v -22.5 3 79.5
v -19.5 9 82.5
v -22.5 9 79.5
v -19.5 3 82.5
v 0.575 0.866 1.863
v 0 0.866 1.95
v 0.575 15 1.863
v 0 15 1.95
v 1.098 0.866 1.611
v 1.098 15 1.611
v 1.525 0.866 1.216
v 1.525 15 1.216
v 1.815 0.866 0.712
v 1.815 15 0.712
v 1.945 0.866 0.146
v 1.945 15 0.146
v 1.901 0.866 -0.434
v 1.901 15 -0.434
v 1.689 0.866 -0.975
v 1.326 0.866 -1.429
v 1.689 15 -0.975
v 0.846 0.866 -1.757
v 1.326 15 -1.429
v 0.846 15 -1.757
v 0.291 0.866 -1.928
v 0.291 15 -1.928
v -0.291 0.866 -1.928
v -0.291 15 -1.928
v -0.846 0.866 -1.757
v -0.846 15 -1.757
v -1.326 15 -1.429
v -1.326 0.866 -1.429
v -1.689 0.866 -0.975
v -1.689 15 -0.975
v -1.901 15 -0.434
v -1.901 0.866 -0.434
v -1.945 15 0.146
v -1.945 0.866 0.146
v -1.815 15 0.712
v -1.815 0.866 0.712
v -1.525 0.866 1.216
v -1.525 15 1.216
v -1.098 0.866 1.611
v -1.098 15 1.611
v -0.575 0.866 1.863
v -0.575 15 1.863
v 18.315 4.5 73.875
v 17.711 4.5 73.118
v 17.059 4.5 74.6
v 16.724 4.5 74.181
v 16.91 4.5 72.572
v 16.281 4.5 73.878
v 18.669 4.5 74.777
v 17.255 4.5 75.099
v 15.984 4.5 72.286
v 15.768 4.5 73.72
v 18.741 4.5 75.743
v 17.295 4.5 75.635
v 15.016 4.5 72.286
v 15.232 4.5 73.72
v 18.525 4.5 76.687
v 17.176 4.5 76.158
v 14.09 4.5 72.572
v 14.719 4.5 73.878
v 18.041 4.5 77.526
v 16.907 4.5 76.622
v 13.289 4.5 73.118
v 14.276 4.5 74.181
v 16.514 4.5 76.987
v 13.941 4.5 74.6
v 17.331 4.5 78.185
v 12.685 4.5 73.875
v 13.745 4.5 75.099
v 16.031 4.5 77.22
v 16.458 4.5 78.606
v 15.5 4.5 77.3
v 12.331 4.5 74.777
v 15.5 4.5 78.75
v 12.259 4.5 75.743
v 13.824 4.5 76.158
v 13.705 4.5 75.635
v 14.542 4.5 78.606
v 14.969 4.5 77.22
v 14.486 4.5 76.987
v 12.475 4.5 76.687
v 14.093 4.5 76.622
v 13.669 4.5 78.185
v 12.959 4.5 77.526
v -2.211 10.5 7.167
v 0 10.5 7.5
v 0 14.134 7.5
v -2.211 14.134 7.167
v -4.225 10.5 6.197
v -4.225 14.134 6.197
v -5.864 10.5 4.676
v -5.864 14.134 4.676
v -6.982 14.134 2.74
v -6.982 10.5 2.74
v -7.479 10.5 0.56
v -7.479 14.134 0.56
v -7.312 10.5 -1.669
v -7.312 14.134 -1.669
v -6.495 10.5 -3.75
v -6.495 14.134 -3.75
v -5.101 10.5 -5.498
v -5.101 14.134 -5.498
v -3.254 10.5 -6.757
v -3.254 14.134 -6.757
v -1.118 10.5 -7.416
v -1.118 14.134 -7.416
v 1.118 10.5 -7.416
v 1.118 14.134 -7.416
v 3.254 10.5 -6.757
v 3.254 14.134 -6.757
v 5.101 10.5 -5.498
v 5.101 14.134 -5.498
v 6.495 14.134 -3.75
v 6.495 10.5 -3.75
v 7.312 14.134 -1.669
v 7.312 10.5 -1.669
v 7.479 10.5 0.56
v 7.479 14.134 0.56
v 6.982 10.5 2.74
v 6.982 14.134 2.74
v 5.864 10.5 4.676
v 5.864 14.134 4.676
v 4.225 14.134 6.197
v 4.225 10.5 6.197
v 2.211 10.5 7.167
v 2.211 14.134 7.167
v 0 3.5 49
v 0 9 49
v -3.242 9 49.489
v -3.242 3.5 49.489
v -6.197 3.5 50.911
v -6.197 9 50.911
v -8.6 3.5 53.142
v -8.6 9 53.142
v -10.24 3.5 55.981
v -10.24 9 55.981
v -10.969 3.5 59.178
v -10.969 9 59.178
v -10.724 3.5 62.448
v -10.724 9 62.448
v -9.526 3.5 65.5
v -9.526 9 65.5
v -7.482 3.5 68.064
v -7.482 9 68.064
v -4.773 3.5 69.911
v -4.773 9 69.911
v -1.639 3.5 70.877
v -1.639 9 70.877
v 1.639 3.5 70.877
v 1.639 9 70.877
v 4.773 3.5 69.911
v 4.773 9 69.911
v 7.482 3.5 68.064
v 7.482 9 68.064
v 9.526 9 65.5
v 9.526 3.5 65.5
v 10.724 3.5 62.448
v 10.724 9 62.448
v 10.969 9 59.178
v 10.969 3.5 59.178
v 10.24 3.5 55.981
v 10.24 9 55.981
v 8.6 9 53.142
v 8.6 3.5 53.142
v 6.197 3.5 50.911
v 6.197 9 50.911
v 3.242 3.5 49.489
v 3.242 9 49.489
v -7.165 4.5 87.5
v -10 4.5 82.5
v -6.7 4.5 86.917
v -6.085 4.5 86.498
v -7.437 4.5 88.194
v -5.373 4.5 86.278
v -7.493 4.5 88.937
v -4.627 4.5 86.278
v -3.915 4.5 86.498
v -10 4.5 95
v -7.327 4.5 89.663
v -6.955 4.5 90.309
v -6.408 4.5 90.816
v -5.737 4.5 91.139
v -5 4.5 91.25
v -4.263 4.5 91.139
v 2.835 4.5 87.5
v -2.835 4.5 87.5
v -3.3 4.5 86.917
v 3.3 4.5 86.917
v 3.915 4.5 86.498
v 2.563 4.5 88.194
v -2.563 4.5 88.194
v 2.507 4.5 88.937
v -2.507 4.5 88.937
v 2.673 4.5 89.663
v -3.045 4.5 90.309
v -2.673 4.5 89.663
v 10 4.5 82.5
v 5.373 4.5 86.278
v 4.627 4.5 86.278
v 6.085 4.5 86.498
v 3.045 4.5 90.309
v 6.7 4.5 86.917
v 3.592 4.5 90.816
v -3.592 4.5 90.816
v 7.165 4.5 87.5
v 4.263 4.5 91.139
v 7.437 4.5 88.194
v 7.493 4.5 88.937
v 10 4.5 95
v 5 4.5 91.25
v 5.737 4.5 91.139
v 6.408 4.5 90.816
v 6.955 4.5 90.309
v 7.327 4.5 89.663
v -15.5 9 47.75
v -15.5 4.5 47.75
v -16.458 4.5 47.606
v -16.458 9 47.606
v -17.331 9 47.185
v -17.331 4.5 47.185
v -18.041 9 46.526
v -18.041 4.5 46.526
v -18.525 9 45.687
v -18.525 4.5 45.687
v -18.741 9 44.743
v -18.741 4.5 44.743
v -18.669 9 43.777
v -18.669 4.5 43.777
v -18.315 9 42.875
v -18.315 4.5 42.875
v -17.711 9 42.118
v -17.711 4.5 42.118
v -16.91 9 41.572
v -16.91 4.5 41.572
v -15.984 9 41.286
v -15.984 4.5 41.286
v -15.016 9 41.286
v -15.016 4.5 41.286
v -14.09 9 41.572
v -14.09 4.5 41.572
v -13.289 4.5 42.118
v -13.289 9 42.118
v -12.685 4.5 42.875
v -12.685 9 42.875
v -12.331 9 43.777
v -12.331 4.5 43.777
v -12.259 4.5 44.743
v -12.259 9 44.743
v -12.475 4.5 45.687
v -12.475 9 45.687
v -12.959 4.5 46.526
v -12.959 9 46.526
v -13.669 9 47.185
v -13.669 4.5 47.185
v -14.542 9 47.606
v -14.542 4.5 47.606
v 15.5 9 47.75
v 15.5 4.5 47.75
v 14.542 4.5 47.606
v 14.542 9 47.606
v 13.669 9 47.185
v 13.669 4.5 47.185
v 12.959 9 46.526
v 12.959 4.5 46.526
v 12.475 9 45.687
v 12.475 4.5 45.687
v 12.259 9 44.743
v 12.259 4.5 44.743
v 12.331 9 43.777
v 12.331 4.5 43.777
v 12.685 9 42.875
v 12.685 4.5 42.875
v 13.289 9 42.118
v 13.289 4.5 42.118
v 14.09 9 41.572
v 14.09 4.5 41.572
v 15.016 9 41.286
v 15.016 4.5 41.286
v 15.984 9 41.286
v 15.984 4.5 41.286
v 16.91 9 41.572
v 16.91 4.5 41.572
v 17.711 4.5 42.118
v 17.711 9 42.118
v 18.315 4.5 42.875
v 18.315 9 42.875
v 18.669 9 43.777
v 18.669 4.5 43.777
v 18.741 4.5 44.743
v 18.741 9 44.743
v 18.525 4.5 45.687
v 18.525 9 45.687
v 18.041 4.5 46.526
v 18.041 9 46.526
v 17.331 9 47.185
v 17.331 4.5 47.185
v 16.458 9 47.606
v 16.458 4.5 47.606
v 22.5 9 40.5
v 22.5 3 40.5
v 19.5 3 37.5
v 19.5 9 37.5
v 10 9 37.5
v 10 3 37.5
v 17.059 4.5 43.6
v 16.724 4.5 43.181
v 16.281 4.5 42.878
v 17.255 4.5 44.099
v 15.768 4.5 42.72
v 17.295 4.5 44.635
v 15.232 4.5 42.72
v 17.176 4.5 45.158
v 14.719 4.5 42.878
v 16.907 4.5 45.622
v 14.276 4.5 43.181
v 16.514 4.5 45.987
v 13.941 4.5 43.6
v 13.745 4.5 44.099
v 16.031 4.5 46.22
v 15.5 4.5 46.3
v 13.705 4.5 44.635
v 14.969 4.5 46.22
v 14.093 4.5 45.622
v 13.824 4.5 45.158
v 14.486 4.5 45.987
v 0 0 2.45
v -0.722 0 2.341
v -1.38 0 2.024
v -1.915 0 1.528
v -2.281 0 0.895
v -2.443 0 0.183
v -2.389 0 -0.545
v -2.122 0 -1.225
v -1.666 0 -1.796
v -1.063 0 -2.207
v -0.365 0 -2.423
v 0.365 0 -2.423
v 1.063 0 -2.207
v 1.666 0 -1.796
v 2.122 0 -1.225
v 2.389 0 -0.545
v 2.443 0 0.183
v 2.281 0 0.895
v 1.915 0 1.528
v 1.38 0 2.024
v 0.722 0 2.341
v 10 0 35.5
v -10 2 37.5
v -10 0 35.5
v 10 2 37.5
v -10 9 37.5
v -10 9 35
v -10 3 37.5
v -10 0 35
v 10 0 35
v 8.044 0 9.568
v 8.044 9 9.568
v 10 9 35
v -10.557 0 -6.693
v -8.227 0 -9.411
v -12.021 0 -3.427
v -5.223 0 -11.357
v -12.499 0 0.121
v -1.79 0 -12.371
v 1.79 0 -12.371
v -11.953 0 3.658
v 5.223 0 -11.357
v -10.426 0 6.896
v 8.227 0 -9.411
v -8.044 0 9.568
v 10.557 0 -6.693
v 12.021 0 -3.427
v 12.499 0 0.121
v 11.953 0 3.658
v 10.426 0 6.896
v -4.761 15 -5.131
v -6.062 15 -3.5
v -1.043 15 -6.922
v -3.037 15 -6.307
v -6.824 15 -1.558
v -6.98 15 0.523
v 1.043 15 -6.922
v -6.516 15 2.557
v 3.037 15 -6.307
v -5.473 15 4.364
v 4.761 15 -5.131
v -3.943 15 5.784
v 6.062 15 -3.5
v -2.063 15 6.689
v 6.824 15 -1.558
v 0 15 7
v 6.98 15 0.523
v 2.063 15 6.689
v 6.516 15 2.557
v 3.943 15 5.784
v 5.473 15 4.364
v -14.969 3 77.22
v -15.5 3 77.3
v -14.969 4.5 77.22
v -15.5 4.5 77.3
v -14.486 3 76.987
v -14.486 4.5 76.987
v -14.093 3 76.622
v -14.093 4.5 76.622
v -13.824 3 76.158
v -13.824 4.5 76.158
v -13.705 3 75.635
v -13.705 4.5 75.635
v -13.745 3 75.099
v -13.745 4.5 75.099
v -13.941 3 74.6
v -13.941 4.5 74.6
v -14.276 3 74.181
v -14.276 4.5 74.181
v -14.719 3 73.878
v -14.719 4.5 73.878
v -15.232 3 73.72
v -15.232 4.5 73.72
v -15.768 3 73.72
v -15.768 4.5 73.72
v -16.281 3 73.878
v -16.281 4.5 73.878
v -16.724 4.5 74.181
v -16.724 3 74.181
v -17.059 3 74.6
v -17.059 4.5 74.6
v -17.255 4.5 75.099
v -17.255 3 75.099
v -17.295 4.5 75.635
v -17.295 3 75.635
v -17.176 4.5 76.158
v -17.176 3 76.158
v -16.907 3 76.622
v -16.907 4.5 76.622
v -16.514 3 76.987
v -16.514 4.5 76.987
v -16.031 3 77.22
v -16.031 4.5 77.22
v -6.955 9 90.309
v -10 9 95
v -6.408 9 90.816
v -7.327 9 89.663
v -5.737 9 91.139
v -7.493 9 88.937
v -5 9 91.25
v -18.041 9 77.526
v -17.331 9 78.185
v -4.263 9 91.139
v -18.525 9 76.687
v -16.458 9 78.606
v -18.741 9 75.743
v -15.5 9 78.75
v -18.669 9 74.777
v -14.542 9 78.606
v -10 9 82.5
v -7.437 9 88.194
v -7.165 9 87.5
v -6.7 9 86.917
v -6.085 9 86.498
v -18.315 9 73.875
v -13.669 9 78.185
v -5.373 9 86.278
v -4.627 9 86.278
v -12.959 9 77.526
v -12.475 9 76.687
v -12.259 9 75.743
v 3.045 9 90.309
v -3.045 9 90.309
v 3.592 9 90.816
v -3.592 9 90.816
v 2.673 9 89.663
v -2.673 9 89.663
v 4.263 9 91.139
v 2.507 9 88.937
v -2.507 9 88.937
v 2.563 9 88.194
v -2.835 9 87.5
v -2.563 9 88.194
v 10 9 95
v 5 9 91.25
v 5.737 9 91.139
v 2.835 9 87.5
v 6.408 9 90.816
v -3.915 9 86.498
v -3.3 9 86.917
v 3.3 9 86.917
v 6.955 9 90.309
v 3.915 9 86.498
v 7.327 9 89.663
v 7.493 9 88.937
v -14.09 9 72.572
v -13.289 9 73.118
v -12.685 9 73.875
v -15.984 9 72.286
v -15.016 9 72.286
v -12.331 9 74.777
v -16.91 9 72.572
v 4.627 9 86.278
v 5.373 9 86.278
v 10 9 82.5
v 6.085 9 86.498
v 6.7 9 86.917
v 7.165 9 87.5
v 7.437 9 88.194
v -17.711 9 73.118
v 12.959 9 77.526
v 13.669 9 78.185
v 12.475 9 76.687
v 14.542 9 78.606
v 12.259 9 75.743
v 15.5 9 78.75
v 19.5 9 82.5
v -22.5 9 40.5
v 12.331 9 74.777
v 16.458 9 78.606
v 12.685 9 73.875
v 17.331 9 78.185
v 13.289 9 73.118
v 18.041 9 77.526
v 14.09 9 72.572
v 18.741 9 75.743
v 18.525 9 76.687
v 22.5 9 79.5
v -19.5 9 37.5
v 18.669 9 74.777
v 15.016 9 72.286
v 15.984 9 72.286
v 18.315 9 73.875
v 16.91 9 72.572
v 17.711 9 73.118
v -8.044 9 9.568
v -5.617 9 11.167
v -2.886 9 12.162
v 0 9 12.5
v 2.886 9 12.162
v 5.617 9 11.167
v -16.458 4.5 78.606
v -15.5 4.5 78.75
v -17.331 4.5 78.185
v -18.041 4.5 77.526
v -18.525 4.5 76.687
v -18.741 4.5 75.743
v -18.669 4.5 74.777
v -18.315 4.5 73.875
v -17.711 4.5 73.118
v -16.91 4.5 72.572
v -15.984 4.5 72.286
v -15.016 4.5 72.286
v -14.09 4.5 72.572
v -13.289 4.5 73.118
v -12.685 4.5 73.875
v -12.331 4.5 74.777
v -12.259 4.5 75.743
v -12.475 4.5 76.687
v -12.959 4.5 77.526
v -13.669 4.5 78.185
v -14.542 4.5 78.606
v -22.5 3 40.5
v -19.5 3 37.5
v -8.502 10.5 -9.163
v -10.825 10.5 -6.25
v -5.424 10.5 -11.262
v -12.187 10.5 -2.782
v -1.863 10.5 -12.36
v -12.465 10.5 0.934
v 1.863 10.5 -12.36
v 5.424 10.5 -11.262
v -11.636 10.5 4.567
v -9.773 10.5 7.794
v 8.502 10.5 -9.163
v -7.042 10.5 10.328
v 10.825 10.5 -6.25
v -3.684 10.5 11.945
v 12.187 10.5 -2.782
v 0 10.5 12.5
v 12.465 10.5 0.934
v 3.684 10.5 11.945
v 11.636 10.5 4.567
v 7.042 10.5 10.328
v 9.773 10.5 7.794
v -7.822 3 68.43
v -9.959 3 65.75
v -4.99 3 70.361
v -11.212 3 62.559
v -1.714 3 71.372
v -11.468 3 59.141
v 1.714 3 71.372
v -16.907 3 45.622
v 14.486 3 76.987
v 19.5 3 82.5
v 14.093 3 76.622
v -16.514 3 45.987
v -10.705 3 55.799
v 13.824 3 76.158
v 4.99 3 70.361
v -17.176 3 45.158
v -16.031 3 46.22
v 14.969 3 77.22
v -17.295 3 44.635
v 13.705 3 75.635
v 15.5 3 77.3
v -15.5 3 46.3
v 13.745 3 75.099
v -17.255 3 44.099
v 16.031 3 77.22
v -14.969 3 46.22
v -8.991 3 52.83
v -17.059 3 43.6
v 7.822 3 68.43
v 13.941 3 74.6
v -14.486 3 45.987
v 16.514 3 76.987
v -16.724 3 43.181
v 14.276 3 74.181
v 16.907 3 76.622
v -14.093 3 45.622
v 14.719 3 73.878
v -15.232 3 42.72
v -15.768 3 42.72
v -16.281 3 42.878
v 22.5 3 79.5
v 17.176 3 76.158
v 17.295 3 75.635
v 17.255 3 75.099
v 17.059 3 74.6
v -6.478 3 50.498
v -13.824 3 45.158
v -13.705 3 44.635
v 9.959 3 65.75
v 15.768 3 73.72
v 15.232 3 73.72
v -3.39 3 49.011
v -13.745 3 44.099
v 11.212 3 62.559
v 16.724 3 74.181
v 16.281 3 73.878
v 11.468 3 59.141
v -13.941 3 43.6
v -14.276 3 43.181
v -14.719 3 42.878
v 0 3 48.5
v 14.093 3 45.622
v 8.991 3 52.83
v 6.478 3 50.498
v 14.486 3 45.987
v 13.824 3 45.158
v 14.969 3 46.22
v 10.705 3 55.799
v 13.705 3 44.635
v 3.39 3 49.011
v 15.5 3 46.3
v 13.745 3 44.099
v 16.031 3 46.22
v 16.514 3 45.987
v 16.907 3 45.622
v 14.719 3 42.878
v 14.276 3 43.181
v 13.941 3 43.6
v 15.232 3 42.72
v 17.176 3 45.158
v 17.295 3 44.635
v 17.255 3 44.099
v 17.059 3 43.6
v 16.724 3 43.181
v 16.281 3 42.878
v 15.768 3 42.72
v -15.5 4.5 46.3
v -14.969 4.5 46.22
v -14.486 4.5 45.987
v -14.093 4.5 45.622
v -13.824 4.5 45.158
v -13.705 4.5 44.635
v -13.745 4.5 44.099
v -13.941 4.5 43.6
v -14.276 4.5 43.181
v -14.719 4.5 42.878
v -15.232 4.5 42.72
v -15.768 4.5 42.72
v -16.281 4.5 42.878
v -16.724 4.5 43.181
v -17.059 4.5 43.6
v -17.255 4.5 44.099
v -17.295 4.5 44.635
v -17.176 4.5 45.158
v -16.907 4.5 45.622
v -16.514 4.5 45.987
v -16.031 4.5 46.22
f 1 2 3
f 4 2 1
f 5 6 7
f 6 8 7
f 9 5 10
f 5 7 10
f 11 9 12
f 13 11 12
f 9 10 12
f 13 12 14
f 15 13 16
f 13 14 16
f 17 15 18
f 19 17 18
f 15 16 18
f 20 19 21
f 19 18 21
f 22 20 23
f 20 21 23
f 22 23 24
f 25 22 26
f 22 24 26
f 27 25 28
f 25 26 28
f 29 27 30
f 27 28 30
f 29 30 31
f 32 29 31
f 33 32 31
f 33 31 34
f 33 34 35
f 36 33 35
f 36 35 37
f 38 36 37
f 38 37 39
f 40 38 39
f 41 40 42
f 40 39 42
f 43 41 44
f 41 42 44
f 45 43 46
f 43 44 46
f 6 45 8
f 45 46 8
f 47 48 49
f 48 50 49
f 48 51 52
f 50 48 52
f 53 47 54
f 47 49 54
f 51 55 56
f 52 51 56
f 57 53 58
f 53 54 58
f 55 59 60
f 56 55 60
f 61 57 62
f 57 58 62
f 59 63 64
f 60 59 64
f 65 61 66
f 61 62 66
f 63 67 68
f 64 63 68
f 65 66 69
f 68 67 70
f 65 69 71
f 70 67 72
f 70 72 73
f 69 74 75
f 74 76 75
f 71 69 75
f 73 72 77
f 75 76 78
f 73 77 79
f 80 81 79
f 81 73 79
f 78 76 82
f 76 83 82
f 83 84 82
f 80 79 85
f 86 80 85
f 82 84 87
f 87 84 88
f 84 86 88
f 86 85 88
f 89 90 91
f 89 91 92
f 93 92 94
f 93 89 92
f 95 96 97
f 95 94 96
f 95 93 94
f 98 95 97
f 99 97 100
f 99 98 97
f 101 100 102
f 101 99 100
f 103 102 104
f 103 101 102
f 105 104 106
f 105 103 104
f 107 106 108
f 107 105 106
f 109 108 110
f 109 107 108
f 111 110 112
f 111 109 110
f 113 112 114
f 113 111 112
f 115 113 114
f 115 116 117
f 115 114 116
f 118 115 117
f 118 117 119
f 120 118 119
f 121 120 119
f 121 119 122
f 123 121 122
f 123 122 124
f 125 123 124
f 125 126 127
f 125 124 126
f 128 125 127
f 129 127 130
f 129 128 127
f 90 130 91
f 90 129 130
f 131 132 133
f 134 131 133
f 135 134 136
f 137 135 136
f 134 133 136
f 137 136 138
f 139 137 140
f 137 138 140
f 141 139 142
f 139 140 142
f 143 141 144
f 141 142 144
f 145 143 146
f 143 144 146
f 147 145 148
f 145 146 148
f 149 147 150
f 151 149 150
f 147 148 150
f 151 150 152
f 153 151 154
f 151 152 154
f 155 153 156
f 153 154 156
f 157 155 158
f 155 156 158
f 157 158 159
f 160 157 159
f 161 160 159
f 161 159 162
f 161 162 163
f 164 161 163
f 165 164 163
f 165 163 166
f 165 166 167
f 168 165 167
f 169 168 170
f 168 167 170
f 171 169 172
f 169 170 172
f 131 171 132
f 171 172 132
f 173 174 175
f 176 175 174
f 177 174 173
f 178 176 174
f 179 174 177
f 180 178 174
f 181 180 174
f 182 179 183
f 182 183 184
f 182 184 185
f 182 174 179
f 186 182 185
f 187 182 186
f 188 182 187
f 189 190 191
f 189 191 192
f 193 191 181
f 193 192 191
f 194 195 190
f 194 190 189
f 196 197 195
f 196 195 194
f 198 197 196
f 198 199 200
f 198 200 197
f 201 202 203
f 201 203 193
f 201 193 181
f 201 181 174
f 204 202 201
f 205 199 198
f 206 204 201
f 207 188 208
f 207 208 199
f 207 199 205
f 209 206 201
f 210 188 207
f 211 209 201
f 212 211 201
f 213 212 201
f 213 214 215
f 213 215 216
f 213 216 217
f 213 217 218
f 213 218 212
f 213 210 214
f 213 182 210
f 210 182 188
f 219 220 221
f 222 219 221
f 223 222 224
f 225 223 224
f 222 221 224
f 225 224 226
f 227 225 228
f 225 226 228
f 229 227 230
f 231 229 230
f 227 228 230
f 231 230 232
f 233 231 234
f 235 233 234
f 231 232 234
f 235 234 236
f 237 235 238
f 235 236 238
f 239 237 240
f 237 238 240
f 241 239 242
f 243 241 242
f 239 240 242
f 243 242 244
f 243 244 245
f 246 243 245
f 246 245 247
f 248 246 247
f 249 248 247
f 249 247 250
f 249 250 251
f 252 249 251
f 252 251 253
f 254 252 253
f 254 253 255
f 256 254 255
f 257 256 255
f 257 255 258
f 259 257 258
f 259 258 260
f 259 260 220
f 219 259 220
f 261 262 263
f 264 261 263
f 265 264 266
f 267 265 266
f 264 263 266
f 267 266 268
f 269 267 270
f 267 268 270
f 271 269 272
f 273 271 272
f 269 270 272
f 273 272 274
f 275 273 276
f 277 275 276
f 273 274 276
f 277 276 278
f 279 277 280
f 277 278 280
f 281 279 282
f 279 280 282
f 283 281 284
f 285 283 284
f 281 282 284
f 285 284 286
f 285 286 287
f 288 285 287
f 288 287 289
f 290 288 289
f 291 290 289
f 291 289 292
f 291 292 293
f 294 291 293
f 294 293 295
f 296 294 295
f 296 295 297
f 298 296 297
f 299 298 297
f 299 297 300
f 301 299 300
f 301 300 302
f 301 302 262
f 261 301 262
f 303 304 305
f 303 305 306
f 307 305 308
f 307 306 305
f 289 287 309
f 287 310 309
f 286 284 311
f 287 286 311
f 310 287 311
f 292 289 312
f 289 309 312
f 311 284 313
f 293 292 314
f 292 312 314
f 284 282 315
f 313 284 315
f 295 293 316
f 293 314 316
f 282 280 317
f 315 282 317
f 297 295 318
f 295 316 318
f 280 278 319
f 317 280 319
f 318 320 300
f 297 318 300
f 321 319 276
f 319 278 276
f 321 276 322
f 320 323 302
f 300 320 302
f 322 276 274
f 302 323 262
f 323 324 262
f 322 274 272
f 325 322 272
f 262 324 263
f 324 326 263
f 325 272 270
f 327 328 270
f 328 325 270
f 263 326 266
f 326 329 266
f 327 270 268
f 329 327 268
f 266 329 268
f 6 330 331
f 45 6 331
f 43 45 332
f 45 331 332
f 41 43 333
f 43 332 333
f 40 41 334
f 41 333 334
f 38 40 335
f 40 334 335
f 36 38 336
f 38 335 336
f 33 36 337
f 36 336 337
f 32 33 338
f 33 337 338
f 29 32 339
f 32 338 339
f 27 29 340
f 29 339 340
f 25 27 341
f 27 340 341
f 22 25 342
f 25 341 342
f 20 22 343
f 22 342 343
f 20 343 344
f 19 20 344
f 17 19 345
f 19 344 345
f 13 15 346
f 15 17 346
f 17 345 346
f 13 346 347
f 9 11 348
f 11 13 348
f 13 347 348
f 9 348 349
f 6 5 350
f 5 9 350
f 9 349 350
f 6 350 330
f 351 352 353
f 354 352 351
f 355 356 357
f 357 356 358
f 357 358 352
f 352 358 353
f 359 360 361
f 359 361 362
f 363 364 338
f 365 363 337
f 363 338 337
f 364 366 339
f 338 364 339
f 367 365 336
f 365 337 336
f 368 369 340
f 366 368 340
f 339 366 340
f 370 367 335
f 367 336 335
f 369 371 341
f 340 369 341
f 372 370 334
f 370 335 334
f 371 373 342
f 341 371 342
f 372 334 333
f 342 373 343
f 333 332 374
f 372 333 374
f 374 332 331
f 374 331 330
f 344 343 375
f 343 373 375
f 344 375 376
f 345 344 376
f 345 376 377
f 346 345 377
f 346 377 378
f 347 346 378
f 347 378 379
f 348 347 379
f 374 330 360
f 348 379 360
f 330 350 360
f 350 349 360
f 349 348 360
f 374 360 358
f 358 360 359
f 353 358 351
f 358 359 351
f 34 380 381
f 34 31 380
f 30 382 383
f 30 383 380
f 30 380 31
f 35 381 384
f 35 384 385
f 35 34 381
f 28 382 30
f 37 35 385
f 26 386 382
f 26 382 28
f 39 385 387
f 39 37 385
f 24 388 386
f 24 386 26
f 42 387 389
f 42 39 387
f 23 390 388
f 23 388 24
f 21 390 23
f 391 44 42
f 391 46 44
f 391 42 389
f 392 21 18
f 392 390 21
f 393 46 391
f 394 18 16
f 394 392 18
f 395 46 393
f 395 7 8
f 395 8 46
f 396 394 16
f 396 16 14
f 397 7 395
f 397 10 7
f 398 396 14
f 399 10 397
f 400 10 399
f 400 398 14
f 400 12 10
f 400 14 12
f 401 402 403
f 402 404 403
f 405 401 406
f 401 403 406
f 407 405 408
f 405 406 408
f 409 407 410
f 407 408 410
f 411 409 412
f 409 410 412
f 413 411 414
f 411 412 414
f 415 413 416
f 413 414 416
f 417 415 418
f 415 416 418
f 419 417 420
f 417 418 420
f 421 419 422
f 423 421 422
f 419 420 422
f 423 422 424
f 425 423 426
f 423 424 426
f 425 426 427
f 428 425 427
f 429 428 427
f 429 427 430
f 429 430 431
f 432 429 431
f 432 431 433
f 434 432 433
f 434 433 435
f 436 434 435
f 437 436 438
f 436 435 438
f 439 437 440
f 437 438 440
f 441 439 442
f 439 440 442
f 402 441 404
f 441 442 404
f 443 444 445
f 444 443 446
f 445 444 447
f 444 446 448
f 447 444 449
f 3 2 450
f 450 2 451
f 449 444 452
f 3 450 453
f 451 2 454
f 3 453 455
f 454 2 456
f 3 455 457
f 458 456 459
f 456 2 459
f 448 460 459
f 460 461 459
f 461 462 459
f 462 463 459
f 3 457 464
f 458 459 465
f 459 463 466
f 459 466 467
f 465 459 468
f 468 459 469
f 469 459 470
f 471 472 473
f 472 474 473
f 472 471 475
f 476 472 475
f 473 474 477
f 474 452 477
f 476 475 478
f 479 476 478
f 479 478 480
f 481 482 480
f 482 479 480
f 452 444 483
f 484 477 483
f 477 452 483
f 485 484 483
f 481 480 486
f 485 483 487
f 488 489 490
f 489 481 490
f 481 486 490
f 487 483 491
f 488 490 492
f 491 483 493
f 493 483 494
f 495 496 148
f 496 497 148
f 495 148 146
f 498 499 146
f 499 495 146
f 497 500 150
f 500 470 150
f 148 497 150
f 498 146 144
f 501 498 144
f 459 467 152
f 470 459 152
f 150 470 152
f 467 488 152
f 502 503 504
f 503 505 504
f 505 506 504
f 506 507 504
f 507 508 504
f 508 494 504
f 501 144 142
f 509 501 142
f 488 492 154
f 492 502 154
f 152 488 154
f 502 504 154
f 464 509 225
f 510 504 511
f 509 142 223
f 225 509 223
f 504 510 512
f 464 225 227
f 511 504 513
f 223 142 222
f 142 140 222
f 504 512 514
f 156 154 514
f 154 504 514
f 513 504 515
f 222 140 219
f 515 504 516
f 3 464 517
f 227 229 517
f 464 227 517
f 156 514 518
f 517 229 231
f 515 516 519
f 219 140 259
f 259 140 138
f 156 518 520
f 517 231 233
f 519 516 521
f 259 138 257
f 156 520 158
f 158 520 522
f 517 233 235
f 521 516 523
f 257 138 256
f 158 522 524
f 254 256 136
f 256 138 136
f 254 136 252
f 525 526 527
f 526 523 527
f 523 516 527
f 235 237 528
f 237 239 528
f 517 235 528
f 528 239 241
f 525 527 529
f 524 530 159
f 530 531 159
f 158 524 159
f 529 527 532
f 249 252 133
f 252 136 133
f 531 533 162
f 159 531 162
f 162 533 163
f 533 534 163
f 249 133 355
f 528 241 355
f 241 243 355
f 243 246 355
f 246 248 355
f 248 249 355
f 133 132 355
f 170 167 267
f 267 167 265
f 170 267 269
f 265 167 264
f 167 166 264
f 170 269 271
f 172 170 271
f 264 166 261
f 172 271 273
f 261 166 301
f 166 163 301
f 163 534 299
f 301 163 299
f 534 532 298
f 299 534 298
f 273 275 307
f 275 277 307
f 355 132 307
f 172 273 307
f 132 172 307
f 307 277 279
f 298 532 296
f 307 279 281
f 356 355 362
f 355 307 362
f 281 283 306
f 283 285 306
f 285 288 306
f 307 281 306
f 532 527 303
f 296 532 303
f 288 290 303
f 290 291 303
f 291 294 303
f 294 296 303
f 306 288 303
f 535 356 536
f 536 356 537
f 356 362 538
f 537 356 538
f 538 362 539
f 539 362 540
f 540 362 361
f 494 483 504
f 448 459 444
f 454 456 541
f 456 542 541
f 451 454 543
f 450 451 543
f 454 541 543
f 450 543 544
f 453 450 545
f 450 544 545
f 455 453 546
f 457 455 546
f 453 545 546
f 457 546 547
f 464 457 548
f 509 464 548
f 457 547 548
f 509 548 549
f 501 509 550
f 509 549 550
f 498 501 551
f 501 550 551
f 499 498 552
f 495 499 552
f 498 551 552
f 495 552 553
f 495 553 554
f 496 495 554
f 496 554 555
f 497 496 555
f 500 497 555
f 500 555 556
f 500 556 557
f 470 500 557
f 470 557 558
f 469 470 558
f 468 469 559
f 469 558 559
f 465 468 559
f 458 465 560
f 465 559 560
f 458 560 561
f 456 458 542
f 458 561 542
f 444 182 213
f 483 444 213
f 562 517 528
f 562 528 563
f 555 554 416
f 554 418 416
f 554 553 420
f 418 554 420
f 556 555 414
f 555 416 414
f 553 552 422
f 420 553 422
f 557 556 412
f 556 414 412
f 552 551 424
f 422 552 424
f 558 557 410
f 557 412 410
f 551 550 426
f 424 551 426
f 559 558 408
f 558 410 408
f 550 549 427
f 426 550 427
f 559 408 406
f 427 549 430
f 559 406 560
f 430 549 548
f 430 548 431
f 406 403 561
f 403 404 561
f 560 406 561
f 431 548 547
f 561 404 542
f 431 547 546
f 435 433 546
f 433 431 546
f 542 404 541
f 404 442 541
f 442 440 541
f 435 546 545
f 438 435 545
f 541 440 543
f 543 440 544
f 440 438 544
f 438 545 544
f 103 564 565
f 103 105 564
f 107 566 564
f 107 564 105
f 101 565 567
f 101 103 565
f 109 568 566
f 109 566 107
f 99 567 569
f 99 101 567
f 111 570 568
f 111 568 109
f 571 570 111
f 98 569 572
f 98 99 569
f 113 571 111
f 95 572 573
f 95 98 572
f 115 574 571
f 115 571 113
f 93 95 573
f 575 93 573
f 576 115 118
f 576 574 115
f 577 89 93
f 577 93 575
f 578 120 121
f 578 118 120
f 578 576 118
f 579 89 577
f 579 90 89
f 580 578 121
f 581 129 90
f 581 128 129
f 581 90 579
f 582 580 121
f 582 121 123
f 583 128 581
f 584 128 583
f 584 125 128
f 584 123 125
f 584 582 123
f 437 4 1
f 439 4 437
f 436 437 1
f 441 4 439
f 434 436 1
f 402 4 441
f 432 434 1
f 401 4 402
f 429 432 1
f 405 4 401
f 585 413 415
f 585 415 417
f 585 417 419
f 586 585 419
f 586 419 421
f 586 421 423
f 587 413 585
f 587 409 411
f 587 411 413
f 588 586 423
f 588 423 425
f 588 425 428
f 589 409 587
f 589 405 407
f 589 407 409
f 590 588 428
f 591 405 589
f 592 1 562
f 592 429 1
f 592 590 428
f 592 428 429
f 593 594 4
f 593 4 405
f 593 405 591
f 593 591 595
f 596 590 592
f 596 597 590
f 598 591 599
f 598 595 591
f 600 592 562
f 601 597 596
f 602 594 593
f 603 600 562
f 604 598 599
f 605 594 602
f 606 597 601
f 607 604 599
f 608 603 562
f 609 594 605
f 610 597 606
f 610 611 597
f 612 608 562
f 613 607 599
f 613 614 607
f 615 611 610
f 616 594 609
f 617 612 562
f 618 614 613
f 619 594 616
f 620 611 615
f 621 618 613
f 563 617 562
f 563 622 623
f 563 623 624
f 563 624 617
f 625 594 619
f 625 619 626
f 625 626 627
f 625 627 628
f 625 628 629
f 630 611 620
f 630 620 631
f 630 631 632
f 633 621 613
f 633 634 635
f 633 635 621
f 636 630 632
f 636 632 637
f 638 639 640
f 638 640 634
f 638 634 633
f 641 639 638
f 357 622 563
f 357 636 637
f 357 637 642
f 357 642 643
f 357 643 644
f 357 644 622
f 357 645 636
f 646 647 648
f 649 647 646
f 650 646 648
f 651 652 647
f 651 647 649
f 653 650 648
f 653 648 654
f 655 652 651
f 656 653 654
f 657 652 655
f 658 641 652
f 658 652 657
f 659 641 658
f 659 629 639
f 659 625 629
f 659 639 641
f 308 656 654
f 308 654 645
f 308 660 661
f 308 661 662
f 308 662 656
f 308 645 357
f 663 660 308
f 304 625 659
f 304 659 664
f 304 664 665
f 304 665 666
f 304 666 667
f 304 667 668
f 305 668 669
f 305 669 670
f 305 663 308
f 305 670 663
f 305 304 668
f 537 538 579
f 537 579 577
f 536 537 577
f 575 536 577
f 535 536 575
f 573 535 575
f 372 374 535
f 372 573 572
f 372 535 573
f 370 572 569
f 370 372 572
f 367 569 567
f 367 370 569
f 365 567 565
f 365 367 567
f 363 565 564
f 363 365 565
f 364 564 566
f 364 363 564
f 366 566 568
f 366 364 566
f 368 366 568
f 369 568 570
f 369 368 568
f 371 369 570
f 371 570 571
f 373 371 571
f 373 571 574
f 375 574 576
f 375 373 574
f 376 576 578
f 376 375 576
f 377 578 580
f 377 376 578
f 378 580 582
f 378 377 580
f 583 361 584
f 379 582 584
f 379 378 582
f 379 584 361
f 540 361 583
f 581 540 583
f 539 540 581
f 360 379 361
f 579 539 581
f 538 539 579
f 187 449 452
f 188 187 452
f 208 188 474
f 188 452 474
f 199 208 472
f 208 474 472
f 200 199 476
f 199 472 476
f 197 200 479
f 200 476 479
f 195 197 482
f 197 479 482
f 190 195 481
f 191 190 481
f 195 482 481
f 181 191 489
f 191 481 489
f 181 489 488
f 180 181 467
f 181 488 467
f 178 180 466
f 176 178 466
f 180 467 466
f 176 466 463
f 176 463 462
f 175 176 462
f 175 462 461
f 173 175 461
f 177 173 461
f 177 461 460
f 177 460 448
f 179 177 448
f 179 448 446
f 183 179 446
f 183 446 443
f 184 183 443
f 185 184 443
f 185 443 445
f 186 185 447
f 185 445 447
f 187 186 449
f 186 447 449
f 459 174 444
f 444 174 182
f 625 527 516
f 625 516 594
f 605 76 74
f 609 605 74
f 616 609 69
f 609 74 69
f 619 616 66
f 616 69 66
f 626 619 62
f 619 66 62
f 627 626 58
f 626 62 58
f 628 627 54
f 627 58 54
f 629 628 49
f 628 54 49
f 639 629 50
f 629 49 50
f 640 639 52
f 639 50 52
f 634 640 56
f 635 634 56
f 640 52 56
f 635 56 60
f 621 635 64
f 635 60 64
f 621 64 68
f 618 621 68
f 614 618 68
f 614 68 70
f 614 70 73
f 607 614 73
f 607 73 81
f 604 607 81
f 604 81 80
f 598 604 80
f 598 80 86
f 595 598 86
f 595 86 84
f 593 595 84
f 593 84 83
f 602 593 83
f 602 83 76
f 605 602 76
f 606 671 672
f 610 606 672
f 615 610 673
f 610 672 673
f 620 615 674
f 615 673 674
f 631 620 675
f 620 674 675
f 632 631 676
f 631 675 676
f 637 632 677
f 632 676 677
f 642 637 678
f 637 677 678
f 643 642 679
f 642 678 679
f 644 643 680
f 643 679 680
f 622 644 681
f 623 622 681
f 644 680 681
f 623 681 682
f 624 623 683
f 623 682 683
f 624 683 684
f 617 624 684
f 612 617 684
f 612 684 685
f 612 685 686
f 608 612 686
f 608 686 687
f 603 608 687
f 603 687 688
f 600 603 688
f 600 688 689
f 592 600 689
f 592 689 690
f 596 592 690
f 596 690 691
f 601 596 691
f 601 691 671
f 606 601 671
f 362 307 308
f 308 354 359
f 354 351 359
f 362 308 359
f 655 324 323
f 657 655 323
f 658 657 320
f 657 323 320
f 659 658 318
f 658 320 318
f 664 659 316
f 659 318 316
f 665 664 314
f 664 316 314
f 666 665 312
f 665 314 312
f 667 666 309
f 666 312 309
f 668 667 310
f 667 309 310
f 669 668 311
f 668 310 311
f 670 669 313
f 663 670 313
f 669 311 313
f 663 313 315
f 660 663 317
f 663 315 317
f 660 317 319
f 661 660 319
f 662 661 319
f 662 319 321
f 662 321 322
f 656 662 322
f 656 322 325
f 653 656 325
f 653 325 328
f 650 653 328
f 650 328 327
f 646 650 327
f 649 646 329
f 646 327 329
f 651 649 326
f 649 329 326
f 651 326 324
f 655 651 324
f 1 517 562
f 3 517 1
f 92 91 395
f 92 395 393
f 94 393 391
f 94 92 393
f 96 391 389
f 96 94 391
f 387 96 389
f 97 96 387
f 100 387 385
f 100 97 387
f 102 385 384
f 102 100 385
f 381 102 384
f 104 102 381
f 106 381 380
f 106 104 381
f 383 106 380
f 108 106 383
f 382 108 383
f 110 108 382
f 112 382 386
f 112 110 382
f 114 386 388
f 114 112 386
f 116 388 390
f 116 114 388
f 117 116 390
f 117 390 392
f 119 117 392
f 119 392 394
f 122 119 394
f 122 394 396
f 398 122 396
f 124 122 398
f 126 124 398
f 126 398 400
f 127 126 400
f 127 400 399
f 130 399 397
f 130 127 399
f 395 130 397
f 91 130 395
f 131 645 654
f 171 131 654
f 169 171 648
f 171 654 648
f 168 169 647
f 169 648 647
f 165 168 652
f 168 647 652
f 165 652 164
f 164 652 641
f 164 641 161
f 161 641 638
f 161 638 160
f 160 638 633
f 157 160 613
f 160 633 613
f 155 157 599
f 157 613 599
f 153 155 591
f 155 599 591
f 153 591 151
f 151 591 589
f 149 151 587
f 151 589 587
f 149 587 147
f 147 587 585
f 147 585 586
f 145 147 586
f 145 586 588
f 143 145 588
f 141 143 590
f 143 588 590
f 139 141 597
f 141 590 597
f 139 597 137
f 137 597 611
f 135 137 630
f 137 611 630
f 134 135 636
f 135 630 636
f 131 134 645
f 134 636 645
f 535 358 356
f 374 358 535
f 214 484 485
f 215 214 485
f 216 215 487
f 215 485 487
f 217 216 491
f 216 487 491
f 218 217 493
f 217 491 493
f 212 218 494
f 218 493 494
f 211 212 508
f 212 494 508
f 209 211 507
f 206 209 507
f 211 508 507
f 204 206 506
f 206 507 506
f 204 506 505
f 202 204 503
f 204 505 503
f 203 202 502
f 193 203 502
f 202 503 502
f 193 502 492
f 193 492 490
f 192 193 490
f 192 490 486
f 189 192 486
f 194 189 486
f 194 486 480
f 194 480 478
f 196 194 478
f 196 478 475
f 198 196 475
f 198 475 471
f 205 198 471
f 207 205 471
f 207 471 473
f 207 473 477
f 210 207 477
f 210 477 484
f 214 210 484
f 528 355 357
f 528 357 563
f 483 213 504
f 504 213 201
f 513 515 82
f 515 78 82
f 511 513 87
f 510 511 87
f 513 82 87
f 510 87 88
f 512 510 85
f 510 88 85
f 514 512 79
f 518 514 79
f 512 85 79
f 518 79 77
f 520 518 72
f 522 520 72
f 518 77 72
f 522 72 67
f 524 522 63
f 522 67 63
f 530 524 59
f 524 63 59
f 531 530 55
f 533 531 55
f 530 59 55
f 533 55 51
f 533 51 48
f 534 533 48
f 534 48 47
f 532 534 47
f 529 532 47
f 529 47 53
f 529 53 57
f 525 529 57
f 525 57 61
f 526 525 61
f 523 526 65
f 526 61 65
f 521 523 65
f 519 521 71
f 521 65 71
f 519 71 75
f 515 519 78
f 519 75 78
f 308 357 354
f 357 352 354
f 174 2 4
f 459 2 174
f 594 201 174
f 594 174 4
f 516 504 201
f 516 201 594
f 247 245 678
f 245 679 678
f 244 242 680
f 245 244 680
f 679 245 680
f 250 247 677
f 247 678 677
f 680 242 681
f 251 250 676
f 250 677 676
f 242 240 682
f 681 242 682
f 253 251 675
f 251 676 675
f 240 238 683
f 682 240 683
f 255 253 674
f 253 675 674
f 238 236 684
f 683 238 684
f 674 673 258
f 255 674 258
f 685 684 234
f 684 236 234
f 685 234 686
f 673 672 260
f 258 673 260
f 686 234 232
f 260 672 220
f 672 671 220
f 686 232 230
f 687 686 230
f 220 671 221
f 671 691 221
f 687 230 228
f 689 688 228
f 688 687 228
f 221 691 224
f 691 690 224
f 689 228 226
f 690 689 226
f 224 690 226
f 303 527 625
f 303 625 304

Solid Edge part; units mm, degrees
sketch "Sketch1" plane through (0, 0, 0) normal (1, 0, 0) x (0, 1, 0)
  line L0 (0, 1.95) -> (15, 1.95)
  line L1 (15, 1.95) -> (15, 7.5)
  line L2 (15, 7.5) -> (10.5, 7.5)
  line L3 (10.5, 7.5) -> (10.5, 12.5)
  line L4 (10.5, 12.5) -> (0, 12.5)
  line L5 (0, 12.5) -> (0, 1.95)
  dimension "D1" = 10.5
  dimension "D2" = 4.5
revolve "RevolvedProtrusion1" add sketch "Sketch1" angle 360 about axis through (0, -60, 0) along (0, 1, 0)
chamfer "Chamfer_1" distance 0.5 angle 60 1 edges at (0, 15, 7.5) measured on face at (-4.85, 15, 5.15)
sketch "Sketch2" plane through (0, 0, 0) normal (0, -1, 0) x (1, 0, 0)
  line L0 (-7.5, 2.5) -> (7.5, 2.5)
  line L1 (7.5, 2.5) -> (10, 35)
  line L2 (10, 95) -> (10, 35)
  line L3 (-10, 95) -> (10, 95)
  line L4 (-10, 35) -> (-10, 95)
  line L5 (-10, 35) -> (-7.5, 2.5)
  dimension "D1" = 20
  dimension "D2" = 2.5
  dimension "D3" = 15
  dimension "D4" = 95
  dimension "D5" = 35
extrude "ExtrudedProtrusion_1" add sketch "Sketch2" against normal blind 9
chamfer "Chamfer_2" distance 0.5 angle 60 1 edges at (0, 0, 1.95) measured on face at (-8.0833, 0, 4.3417)
sketch "Sketch3" plane through (0, 9, 43.7496) normal (0, 1, 0) x (0, 0, -1)
  line L0 (-38.7504, 22.5) -> (-38.7504, -22.5)
  line L1 (-38.7504, -22.5) -> (6.2496, -22.5)
  line L2 (6.2496, -22.5) -> (6.2496, 22.5)
  line L3 (6.2496, 22.5) -> (-38.7504, 22.5)
  dimension "D1" = 60
  dimension "D2" = 45
extrude "ExtrudedProtrusion_2" add sketch "Sketch3" against normal blind 9
sketch "Sketch4" plane through (0, 0, 36.25) normal (0, -1, 0) x (0, 0, 1)
  line L0 (1.25, -22.5) -> (46.25, -22.5)
  line L1 (46.25, -22.5) -> (46.25, 22.5)
  line L2 (46.25, 22.5) -> (1.25, 22.5)
  line L3 (1.25, 22.5) -> (1.25, -22.5)
extrude "ExtrudedCutout_1" cut sketch "Sketch4" against normal blind 3
hole "Hole_1" at (0, 3, 60) direction (0, 1, 0) diameter 8 end up to next
hole "Hole_2" at (15.5, 9, 75.5) direction (0, -1, 0) diameter 3.6 end up to next counterbore diameter 6.5 counterbore depth 4.5
hole "Hole1" at (-15.5, 9, 75.5) direction (0, -1, 0) diameter 3.6 end up to next counterbore diameter 6.5 counterbore depth 4.5
hole "Hole2" at (-15.5, 9, 44.5) direction (0, -1, 0) diameter 3.6 end up to next counterbore diameter 6.5 counterbore depth 4.5
hole "Hole3" at (15.5, 9, 44.5) direction (0, -1, 0) diameter 3.6 end up to next counterbore diameter 6.5 counterbore depth 4.5
sketch "Sketch5" plane through (0, 4.5, 95) normal (0, 0, 1) x (0, 1, 0)
  line L0 (-4.5, 10) -> (0, 10)
  line L1 (0, 10) -> (0, -10)
  line L2 (0, -10) -> (-4.5, -10)
  line L3 (-4.5, -10) -> (-4.5, 10)
extrude "ExtrudedCutout_2" cut sketch "Sketch5" against normal blind 12.5
hole "Hole_6" at (5, 9, 88.75) direction (0, -1, 0) diameter 5 end up to next
hole "Hole4" at (-5, 9, 88.75) direction (0, -1, 0) diameter 5 end up to next
chamfer "Chamfer_3" distance 3 angle 45 4 edges at (22.5, 6, 37.5) (22.5, 6, 82.5) (-22.5, 6, 82.5) (-22.5, 6, 37.5)
chamfer "Chamfer_4" distance 2 angle 45 1 edges at (0, 0, 37.5)
hole "Hole_8" at (0, 3, 60) direction (0, 1, 0) diameter 22 depth 50.8
chamfer "Chamfer_5" distance 0.5 angle 45 1 edges at (0, 3, 71)
properties material "Polyethylene, low density"
